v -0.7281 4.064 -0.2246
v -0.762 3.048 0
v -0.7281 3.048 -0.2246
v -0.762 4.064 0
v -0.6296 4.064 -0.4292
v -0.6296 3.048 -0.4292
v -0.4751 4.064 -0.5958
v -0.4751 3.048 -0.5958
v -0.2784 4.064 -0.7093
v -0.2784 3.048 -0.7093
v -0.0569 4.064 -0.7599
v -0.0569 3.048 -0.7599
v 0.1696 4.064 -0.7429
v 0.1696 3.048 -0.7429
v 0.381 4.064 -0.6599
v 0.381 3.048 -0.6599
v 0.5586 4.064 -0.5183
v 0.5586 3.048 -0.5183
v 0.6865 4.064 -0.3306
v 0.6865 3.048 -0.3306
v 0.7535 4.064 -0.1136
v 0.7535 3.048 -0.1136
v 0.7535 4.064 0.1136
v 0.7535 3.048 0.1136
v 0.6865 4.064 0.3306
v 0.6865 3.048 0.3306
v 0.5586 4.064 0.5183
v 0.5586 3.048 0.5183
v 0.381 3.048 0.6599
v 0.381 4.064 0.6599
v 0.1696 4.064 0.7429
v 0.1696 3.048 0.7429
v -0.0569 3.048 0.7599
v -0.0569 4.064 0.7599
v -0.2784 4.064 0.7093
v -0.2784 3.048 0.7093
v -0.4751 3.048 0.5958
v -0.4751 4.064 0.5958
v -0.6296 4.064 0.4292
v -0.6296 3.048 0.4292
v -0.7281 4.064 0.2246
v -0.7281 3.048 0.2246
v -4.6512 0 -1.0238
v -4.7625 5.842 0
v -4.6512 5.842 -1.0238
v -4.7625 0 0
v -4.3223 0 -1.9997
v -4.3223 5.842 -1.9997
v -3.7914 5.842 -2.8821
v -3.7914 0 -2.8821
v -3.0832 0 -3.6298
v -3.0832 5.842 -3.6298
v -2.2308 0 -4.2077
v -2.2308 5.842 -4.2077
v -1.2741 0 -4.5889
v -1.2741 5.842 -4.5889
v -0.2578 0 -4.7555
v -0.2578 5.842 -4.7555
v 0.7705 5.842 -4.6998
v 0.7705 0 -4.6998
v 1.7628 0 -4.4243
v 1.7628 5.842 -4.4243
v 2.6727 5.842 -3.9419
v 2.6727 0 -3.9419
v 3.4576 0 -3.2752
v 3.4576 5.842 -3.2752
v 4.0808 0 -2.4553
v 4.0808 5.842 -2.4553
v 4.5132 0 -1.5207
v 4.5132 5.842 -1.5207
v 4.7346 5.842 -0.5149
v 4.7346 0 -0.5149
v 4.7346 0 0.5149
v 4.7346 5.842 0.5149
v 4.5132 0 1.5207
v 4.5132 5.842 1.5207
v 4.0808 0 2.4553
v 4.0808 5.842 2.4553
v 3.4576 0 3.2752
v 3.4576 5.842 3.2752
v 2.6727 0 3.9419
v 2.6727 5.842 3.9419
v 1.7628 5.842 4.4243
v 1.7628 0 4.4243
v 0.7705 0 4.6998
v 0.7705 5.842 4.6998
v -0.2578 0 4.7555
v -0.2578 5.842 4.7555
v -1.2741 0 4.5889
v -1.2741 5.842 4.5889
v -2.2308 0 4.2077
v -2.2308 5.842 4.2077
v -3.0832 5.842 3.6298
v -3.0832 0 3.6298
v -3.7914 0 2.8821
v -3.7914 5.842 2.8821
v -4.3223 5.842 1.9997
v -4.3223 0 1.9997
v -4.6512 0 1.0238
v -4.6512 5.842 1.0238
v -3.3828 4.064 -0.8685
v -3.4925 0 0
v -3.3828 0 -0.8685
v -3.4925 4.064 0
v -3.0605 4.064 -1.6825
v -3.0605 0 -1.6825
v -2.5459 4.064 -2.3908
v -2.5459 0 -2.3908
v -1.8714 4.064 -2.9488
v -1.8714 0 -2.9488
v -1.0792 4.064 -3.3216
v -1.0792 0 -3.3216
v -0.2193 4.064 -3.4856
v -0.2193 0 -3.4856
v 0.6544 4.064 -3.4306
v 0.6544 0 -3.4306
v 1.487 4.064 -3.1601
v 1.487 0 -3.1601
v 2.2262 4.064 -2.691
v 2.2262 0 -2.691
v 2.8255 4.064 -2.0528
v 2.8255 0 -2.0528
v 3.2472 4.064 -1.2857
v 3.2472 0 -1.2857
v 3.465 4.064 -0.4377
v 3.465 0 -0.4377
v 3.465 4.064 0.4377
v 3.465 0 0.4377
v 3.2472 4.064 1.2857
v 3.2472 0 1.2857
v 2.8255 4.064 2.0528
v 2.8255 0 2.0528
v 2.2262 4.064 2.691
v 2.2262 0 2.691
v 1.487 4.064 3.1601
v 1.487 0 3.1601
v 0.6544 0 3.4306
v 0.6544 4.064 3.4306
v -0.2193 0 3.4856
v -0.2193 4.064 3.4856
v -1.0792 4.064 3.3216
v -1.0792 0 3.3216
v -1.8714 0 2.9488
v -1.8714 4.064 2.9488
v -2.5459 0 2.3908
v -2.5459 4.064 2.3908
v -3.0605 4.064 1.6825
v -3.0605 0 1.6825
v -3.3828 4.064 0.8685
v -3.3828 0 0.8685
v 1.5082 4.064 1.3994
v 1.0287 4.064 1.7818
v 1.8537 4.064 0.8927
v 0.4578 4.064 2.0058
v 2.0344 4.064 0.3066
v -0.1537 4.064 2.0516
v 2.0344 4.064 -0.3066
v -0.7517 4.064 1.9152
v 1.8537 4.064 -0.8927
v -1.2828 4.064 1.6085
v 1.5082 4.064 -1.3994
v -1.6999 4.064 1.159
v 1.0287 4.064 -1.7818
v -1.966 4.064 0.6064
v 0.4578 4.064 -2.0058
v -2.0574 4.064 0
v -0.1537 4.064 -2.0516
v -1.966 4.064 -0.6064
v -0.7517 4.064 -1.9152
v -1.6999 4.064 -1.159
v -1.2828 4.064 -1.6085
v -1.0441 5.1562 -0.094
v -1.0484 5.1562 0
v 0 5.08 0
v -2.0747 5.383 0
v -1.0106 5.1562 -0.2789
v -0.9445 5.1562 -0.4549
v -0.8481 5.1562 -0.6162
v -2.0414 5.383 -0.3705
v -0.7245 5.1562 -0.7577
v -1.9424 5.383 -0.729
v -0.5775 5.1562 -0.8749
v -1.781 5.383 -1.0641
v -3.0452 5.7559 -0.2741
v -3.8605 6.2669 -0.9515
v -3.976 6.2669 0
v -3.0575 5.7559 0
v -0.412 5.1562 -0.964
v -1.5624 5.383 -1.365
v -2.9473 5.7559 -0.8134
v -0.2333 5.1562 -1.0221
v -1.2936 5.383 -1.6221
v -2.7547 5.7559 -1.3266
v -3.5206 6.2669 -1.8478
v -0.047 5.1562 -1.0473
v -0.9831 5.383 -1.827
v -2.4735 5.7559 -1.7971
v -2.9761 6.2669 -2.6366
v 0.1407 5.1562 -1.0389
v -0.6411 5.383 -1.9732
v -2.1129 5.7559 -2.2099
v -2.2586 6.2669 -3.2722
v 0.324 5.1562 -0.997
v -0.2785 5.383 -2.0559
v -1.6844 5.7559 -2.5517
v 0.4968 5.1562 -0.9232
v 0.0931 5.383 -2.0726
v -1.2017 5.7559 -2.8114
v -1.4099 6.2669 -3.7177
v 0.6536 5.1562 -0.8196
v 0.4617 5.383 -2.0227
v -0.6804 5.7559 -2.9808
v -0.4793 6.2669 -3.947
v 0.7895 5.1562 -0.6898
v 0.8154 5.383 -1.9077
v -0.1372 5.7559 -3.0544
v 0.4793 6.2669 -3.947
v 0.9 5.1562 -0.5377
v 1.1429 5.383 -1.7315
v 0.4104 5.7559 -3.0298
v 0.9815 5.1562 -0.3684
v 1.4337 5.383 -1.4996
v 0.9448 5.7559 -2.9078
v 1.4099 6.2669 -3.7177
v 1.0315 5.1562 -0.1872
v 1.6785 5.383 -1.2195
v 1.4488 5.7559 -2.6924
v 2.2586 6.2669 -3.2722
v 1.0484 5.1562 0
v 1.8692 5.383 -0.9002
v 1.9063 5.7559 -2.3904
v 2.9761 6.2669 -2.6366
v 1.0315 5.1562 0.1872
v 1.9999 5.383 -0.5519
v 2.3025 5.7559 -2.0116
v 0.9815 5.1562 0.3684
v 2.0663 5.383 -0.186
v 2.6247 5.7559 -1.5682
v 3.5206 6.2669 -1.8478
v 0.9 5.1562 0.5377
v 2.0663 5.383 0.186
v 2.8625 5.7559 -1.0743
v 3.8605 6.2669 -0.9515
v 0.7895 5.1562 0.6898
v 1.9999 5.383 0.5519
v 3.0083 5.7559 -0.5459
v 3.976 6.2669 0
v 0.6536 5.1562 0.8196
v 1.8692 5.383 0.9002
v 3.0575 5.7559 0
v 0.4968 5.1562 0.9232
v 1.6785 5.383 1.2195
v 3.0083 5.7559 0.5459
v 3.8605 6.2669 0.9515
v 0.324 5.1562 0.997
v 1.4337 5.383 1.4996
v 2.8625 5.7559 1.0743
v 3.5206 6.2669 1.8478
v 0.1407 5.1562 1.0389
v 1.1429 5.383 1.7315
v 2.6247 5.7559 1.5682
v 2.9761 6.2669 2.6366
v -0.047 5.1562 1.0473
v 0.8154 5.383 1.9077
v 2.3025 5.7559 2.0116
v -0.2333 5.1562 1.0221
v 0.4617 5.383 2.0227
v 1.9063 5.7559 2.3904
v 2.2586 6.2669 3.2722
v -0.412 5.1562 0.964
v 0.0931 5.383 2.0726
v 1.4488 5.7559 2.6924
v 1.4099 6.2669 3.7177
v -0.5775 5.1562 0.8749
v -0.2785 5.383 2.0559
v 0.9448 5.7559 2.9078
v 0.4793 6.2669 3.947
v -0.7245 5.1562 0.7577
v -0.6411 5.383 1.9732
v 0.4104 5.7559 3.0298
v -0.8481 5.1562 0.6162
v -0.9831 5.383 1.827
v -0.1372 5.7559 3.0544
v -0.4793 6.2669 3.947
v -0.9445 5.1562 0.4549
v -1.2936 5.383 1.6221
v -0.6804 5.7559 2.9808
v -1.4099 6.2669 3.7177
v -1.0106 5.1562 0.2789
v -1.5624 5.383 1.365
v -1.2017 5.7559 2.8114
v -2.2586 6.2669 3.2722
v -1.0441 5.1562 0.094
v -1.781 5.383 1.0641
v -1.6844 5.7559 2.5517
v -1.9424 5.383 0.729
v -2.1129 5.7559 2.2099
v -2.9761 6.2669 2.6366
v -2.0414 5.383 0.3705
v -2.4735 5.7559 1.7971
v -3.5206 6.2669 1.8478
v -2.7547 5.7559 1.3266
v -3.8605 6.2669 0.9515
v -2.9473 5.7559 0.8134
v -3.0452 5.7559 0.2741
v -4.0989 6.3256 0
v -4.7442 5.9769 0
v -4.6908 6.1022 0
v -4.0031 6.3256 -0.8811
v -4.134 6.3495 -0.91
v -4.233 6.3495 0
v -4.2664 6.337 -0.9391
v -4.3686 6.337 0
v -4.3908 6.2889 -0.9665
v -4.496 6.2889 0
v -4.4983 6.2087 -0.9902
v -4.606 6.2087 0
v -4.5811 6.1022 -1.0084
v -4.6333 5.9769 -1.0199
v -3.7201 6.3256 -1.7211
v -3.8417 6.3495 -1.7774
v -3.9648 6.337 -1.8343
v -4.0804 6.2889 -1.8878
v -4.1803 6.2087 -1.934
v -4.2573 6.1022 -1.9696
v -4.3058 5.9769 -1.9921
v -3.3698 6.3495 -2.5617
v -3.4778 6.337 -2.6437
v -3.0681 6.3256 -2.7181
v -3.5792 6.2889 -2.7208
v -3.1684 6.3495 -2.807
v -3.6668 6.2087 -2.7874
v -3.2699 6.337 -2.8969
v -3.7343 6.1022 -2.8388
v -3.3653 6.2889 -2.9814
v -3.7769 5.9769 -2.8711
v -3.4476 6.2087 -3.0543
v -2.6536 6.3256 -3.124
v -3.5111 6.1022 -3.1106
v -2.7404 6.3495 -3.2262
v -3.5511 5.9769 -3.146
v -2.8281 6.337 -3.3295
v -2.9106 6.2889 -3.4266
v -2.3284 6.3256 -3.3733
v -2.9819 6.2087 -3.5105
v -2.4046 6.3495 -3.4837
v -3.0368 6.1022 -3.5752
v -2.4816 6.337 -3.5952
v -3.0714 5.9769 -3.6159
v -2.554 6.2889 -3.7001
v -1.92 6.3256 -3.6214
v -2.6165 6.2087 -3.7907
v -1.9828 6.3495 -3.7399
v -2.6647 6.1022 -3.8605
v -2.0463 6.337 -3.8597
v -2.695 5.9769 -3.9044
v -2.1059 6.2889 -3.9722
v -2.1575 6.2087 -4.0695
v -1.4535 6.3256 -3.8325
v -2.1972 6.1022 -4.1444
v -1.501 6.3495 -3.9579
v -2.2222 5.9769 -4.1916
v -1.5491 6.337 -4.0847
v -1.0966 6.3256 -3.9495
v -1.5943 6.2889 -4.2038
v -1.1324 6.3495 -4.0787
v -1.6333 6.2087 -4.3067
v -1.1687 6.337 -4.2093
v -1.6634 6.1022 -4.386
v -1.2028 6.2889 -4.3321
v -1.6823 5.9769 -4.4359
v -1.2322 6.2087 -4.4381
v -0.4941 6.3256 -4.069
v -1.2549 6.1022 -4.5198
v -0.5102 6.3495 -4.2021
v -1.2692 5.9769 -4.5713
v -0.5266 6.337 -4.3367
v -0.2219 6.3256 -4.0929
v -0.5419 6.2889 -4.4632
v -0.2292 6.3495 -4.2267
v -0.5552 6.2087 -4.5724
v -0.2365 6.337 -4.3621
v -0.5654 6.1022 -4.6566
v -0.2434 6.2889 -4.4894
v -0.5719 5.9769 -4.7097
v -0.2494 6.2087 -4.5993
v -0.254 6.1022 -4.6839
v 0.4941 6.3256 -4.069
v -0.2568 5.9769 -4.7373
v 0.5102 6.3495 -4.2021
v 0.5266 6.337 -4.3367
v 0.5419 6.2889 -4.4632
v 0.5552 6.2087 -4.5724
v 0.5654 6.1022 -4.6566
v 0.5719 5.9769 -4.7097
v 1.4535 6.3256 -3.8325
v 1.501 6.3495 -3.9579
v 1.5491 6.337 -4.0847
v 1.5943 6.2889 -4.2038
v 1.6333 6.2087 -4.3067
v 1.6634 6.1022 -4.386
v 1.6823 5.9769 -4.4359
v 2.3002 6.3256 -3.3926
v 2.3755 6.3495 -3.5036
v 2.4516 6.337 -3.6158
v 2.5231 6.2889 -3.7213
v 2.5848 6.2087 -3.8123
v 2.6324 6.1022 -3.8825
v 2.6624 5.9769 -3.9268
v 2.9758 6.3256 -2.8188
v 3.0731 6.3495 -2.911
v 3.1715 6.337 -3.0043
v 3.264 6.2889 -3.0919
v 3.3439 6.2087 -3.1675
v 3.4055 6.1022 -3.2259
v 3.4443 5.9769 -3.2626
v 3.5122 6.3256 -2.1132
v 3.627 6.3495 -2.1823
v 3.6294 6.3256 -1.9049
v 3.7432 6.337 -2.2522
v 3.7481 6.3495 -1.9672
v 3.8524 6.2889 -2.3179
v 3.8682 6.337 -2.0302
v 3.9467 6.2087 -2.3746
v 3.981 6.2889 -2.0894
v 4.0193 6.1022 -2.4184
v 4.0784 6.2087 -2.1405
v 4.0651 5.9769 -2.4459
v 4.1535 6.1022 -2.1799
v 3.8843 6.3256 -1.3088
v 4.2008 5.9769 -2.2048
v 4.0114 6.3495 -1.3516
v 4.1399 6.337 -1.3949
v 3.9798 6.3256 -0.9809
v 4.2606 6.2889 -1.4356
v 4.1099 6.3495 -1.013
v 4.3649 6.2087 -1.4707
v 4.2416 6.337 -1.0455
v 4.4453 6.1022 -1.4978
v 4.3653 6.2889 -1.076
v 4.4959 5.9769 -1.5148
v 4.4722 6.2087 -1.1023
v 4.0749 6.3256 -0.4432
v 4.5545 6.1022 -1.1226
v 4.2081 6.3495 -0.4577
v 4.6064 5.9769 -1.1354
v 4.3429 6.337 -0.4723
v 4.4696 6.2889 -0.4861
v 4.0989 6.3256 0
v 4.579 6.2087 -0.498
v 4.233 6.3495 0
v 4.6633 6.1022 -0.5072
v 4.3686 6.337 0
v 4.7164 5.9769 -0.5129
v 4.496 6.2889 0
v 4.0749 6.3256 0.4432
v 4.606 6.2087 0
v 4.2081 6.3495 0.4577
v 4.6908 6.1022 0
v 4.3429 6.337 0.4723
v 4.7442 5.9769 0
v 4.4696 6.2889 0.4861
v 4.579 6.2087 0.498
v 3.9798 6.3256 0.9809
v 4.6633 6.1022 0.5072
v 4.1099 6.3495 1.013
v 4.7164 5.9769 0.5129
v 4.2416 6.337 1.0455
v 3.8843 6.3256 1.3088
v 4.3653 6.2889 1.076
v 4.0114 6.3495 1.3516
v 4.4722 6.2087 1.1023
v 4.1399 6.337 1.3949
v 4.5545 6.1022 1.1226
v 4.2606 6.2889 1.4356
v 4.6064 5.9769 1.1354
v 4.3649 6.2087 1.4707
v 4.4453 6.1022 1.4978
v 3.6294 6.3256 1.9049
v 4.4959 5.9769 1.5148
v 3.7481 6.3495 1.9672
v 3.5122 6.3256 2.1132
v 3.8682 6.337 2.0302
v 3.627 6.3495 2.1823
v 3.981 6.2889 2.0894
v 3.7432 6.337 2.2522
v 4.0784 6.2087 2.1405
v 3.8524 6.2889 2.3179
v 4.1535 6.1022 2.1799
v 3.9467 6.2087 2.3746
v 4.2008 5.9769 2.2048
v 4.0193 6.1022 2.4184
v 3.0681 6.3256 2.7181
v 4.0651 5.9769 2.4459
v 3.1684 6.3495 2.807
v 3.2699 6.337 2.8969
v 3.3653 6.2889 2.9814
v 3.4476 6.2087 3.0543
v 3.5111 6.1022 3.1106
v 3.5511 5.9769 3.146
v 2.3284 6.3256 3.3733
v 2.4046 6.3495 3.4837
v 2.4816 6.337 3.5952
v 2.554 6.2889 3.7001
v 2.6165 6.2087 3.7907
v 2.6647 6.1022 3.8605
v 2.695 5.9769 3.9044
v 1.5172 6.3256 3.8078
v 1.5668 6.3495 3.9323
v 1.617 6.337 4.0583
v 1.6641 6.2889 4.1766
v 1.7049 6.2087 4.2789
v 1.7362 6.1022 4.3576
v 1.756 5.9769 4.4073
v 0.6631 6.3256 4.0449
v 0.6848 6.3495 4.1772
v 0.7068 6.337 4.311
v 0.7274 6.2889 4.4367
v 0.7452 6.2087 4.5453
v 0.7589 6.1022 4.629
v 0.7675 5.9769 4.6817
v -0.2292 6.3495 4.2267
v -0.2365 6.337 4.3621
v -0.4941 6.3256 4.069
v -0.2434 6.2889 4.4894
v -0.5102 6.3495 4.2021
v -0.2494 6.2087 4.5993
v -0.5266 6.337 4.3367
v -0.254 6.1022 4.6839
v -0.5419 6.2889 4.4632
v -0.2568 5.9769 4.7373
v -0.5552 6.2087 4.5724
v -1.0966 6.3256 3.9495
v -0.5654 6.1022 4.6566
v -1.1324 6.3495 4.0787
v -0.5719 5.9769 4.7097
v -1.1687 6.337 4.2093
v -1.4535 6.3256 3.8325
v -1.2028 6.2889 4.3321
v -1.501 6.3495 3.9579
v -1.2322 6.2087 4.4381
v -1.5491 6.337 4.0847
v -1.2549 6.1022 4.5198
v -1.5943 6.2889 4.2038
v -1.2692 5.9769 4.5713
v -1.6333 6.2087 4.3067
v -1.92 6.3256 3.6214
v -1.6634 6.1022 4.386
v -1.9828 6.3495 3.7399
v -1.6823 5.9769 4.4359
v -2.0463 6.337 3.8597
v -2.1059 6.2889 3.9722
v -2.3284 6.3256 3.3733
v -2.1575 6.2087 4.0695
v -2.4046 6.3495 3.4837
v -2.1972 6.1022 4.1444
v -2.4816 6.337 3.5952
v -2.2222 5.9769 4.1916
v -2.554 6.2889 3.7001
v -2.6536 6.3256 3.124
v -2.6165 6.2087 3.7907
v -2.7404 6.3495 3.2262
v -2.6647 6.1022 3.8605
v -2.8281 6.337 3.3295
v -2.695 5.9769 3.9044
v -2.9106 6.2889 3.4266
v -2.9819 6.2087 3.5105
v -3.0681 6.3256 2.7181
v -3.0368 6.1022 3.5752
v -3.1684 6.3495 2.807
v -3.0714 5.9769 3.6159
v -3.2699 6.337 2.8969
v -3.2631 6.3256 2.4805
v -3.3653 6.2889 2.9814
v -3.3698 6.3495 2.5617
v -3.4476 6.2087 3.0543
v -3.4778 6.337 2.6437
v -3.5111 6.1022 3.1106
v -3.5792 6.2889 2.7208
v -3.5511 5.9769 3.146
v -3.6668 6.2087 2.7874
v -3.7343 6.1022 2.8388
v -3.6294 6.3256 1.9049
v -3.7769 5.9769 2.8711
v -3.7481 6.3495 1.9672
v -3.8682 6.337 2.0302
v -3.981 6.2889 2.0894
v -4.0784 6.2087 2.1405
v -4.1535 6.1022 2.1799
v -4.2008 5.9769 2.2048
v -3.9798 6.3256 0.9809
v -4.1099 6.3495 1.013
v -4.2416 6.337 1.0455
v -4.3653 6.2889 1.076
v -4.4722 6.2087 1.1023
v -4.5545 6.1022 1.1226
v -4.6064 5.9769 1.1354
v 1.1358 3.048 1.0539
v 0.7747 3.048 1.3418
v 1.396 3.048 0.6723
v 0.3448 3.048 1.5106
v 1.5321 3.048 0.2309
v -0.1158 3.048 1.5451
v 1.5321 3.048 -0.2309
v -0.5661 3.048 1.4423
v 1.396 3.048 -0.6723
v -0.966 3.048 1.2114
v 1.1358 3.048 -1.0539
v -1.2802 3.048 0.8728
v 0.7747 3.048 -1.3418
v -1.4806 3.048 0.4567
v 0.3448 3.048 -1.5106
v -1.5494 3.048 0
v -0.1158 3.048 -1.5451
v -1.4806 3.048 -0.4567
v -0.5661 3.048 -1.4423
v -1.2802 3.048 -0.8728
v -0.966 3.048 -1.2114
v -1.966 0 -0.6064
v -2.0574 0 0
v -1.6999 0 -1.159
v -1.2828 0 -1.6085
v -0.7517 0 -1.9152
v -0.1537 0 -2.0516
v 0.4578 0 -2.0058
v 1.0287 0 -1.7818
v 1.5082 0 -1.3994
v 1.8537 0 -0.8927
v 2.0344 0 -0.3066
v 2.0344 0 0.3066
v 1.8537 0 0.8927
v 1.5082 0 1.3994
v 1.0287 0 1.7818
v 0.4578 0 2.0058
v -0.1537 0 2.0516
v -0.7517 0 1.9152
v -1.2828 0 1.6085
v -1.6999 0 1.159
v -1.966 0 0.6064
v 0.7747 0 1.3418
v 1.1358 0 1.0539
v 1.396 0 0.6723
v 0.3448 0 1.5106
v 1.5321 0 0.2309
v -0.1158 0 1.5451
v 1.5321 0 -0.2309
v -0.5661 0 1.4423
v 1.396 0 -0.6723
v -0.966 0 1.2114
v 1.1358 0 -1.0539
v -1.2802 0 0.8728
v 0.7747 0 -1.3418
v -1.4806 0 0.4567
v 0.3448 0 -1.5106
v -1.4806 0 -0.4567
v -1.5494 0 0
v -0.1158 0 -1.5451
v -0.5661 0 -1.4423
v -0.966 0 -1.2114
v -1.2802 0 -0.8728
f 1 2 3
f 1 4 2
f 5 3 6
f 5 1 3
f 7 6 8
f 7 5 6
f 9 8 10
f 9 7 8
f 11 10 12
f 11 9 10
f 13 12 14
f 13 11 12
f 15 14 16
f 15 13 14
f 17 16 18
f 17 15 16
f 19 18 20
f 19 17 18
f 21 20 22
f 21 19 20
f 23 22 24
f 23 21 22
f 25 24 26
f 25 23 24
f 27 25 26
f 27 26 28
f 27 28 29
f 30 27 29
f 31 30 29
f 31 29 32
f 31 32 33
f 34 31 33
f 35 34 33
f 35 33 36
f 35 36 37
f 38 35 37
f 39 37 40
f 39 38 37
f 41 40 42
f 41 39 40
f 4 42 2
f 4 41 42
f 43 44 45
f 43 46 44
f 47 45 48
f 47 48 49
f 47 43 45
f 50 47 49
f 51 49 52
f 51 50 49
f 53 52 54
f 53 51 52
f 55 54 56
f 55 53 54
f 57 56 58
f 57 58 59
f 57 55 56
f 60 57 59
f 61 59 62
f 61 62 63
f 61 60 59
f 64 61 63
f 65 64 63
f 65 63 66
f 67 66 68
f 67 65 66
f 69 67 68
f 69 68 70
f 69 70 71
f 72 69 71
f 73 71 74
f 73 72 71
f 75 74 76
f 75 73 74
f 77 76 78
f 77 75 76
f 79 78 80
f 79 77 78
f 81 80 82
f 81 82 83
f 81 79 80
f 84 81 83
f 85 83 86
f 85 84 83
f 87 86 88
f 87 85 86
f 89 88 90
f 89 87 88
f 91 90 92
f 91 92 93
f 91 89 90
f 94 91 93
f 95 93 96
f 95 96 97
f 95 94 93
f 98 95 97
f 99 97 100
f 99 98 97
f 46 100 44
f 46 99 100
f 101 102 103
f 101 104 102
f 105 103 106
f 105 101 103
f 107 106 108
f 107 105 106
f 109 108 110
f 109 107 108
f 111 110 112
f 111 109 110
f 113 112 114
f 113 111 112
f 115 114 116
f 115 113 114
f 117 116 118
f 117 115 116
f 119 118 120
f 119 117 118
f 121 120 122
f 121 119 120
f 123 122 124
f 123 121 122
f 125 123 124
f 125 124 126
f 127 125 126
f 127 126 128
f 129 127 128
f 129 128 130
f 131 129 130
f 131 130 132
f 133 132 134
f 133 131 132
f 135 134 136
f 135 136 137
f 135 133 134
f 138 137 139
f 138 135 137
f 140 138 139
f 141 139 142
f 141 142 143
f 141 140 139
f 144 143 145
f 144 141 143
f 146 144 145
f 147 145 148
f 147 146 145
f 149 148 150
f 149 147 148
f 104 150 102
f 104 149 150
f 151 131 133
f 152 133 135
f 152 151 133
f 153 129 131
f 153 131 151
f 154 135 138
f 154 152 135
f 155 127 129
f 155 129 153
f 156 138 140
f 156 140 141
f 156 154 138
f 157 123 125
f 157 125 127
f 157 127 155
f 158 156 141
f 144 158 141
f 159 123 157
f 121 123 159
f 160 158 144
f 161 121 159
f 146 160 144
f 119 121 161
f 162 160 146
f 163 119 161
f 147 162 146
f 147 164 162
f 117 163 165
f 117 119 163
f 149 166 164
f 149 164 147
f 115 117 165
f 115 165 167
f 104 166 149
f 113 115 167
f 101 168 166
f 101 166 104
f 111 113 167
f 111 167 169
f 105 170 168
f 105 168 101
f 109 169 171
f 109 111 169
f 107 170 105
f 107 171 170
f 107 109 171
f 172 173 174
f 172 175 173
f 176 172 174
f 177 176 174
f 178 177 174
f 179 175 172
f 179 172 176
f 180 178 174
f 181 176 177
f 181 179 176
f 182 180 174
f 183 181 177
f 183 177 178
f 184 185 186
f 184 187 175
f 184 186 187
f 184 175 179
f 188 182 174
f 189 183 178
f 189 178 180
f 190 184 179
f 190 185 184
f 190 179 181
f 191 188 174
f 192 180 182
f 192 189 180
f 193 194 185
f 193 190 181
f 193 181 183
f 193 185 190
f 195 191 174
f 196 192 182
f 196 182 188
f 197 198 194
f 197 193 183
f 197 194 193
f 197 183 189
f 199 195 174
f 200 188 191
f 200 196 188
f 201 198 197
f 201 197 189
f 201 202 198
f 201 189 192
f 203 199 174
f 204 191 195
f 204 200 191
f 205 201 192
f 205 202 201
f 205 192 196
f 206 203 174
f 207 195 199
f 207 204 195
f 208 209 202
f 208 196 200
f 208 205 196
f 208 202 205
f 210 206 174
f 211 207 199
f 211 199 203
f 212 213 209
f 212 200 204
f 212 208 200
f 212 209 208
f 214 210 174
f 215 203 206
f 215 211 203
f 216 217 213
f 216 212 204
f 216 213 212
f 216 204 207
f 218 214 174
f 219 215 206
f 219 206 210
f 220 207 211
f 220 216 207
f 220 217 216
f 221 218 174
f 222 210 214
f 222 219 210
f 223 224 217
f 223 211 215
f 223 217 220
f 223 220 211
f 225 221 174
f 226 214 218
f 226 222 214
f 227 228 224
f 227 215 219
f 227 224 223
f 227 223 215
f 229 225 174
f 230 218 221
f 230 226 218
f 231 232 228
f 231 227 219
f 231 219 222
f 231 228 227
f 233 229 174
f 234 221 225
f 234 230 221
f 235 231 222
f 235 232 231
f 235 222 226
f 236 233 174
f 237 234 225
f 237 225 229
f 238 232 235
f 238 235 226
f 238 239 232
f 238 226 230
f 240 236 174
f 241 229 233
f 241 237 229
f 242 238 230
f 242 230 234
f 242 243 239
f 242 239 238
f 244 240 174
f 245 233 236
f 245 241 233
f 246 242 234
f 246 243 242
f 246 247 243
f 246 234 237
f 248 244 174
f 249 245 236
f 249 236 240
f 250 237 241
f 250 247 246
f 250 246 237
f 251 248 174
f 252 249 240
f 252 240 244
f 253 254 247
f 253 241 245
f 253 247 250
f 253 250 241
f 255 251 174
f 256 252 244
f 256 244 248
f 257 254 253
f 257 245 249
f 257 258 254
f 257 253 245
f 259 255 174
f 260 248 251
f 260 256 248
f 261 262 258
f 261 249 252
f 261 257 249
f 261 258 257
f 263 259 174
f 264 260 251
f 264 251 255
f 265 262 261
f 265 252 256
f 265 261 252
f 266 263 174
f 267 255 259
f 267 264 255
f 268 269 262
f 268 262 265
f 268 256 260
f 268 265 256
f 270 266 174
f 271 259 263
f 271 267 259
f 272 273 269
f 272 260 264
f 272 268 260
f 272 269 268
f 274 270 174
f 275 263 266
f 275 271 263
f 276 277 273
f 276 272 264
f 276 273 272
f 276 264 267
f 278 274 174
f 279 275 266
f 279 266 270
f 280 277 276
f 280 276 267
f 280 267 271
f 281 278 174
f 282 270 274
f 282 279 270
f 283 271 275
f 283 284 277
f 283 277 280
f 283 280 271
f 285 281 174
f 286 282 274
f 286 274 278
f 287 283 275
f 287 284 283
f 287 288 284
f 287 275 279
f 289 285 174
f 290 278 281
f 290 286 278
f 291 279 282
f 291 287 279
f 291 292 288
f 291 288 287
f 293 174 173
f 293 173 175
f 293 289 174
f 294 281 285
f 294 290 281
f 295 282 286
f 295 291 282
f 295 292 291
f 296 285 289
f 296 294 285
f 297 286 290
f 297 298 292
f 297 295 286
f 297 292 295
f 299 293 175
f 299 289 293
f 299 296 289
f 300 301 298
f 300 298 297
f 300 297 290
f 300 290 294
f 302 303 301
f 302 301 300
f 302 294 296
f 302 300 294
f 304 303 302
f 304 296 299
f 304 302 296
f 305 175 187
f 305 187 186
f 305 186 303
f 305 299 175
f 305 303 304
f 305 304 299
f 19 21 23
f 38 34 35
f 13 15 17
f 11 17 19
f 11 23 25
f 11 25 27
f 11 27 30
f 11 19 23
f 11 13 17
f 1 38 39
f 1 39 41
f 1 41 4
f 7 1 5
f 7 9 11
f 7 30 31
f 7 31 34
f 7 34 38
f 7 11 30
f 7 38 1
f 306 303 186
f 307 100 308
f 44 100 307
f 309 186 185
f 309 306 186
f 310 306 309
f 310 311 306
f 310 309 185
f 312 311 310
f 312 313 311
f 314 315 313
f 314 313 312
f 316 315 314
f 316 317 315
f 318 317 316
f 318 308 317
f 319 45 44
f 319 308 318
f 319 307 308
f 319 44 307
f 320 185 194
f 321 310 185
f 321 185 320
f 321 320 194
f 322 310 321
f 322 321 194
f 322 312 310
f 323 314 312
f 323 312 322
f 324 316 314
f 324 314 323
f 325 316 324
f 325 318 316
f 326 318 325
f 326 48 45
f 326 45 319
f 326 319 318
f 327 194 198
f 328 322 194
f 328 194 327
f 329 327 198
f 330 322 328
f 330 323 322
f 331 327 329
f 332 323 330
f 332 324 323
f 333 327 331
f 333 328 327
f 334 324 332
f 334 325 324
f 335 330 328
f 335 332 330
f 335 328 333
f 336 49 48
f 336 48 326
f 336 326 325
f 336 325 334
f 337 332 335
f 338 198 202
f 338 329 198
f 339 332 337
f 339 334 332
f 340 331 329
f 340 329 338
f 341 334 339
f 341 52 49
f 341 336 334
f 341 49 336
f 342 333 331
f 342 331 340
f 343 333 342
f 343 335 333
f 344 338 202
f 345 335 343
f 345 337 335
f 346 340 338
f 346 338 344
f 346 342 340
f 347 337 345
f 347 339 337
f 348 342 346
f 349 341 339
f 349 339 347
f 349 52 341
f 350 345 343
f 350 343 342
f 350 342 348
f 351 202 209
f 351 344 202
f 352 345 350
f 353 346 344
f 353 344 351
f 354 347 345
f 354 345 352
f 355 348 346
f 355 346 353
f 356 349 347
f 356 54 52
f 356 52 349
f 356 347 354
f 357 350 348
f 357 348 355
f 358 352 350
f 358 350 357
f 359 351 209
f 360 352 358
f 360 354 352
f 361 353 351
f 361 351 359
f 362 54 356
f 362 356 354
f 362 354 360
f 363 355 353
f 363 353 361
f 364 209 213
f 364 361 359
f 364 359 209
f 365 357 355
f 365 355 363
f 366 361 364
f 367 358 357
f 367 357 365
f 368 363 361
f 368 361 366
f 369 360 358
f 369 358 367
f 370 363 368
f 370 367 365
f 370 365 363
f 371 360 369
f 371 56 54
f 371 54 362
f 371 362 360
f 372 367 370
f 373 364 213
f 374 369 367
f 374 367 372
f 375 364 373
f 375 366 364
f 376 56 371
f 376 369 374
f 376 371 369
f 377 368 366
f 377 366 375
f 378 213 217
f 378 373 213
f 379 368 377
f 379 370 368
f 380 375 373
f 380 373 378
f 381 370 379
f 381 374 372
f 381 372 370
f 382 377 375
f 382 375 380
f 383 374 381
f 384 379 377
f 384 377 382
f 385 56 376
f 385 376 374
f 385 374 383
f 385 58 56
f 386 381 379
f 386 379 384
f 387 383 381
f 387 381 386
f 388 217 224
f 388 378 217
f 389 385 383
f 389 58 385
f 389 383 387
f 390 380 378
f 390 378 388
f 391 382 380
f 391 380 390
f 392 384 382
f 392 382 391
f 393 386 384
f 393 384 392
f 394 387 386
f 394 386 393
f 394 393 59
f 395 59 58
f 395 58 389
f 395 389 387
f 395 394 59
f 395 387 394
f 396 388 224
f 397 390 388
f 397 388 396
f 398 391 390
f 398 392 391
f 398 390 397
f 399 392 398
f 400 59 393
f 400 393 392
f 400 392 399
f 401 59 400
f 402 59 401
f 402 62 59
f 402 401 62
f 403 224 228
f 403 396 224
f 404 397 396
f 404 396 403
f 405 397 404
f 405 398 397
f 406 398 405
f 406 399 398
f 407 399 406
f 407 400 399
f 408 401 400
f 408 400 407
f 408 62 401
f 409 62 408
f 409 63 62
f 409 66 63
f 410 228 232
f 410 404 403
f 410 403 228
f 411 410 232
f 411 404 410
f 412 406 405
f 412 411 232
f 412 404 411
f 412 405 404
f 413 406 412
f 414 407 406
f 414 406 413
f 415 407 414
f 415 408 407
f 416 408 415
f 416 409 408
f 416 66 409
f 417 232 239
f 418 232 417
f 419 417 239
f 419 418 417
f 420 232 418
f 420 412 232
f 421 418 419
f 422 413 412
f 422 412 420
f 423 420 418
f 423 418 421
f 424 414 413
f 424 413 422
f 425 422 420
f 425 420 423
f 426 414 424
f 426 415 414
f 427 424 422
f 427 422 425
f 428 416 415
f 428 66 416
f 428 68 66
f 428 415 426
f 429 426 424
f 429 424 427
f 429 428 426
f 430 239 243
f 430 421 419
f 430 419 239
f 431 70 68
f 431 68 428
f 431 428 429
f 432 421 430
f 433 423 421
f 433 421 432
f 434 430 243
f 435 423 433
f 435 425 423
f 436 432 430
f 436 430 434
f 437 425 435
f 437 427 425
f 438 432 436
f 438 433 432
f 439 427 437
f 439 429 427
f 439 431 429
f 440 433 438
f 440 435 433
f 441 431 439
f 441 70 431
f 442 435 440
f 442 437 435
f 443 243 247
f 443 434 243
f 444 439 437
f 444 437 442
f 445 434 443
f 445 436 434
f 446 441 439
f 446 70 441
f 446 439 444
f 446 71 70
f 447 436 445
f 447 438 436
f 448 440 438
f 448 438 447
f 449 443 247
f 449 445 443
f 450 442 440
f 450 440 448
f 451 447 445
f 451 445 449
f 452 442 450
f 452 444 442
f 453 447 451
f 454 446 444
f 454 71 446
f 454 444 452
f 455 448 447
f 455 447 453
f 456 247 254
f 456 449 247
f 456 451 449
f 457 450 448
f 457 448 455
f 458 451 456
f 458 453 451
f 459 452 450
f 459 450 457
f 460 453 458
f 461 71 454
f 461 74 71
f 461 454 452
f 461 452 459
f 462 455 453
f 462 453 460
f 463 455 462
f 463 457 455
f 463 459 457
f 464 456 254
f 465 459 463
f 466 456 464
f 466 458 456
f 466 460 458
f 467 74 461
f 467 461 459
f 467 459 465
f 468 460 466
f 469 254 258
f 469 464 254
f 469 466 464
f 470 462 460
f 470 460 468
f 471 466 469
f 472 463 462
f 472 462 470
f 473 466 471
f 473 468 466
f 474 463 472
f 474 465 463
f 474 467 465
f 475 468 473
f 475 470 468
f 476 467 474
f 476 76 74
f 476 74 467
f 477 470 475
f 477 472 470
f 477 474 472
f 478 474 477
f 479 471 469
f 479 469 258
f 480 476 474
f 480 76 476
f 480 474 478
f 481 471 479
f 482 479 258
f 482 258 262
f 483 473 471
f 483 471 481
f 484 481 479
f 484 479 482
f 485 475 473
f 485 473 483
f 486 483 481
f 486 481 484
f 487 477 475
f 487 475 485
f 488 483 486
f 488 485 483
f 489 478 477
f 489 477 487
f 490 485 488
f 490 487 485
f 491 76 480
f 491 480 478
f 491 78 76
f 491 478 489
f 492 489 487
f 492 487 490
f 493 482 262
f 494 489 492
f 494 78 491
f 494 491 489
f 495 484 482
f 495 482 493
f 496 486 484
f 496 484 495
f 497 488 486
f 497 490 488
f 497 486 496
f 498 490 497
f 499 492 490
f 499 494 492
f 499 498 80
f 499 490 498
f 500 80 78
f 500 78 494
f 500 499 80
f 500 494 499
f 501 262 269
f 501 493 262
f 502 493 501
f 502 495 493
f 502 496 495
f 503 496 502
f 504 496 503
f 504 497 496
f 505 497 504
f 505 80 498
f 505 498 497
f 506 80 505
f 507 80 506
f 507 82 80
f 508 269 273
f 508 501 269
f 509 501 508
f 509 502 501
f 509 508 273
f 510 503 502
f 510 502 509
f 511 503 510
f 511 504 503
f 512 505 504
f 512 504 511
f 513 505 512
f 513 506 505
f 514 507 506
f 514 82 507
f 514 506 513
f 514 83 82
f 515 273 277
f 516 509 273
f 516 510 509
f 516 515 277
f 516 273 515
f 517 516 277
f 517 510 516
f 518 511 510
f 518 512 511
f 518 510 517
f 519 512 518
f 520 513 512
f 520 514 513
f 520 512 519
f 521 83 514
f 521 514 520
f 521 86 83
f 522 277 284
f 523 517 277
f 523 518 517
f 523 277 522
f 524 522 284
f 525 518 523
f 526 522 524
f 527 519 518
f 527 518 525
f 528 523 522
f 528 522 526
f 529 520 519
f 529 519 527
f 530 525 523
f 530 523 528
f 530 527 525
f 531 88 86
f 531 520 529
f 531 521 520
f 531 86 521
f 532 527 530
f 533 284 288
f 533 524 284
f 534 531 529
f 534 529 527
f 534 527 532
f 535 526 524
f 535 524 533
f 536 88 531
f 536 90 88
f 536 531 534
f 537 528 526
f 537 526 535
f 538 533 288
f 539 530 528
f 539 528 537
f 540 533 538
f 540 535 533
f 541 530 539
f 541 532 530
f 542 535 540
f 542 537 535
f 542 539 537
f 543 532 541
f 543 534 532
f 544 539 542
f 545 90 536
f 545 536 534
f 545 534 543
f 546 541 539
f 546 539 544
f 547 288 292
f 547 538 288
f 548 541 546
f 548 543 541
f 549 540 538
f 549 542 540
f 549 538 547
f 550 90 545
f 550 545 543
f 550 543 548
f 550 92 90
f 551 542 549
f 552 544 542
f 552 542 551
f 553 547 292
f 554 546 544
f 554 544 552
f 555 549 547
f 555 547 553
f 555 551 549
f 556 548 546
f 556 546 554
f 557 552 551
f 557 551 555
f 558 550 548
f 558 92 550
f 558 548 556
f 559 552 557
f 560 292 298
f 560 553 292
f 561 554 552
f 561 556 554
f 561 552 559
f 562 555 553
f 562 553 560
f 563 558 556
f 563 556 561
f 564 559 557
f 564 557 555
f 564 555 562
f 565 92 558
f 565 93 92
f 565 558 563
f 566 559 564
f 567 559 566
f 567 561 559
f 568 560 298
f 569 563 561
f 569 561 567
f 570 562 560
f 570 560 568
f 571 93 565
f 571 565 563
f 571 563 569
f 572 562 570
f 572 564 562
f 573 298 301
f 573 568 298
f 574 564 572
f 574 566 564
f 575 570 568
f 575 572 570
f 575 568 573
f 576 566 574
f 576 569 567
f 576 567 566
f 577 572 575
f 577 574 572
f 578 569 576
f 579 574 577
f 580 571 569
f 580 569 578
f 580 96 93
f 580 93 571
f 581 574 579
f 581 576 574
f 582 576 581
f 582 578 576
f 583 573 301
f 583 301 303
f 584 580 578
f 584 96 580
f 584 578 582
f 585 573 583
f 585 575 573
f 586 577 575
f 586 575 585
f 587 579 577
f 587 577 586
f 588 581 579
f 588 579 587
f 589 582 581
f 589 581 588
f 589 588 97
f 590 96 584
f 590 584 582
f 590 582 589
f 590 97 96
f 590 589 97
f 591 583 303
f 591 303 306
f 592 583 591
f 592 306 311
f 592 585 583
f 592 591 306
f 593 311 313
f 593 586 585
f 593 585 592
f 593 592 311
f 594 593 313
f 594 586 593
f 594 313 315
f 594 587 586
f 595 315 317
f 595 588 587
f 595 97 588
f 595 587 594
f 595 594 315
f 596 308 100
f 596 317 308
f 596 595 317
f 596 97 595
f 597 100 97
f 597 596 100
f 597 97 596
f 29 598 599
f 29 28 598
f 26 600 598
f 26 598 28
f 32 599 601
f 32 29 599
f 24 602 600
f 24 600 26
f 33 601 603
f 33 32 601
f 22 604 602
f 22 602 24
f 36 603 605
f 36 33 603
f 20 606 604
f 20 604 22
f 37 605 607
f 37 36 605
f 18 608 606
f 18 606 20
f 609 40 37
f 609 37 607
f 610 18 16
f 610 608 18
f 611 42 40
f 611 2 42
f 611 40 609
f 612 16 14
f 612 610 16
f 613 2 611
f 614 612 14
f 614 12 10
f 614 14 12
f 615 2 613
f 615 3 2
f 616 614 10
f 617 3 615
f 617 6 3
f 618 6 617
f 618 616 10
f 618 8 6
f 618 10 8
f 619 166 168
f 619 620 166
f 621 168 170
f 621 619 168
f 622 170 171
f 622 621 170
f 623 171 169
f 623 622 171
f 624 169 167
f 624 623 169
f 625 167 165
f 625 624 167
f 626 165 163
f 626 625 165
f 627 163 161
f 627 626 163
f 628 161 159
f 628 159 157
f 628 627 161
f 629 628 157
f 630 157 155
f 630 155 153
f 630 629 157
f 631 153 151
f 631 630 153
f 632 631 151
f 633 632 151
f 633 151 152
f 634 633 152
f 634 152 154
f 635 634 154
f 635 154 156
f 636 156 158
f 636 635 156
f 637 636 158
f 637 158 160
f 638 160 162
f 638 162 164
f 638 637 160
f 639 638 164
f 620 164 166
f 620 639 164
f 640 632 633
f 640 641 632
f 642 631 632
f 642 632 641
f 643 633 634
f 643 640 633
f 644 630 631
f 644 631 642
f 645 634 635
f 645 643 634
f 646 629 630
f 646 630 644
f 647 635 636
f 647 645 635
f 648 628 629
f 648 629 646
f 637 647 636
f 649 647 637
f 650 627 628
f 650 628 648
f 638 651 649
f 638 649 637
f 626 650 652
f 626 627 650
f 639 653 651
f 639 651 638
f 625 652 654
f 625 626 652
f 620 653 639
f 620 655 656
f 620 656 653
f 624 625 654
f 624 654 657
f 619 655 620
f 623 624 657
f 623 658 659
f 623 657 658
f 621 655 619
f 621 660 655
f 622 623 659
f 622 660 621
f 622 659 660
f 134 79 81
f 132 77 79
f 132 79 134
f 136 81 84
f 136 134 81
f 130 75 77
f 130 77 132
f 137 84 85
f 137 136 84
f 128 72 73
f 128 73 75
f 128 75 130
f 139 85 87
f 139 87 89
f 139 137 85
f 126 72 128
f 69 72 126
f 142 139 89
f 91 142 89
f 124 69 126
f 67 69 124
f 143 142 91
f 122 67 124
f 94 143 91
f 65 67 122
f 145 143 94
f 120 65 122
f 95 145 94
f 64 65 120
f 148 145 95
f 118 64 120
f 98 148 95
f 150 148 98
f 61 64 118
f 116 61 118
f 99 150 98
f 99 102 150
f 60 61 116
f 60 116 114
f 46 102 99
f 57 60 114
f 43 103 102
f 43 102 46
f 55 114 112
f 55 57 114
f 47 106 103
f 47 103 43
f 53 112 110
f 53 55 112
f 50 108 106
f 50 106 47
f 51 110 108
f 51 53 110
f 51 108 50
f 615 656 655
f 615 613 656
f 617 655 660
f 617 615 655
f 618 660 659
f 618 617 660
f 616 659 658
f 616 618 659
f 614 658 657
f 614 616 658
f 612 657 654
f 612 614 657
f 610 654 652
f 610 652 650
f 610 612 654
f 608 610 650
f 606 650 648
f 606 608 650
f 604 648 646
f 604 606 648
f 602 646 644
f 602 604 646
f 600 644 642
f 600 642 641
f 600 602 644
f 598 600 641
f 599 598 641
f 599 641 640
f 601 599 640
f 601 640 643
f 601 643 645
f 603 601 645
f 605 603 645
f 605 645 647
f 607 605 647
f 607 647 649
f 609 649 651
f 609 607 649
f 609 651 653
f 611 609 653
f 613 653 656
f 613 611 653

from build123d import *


with BuildPart() as part:
    # Sketch1 → Revolve1 (revolve)
    with BuildSketch(Plane.XY):
        with BuildLine():
            Line((-1.5494, 0), (-1.5494, 3.048))
            Line((-1.5494, 3.048), (-0.762, 3.048))
            Line((-0.762, 3.048), (-0.762, 4.064))
            Line((-0.762, 4.064), (0, 4.064))
            Line((0, 4.064), (0, 5.08))
            ThreePointArc((0, 5.08), (-2.074697908, 5.383049508), (-3.976029965, 6.266874616))
            ThreePointArc((-3.976029965, 6.266874616), (-4.495955195, 6.288948978), (-4.7625, 5.842))
            Line((-4.7625, 5.842), (-4.7625, 0))
            Line((-4.7625, 0), (-3.4925, 0))
            Line((-3.4925, 0), (-3.4925, 4.064))
            Line((-3.4925, 4.064), (-2.0574, 4.064))
            Line((-2.0574, 4.064), (-2.0574, 0))
            Line((-2.0574, 0), (-1.5494, 0))
        make_face()
    revolve(axis=Axis((0, 0, 0), (0, -1, 0)))


solid = part.part
